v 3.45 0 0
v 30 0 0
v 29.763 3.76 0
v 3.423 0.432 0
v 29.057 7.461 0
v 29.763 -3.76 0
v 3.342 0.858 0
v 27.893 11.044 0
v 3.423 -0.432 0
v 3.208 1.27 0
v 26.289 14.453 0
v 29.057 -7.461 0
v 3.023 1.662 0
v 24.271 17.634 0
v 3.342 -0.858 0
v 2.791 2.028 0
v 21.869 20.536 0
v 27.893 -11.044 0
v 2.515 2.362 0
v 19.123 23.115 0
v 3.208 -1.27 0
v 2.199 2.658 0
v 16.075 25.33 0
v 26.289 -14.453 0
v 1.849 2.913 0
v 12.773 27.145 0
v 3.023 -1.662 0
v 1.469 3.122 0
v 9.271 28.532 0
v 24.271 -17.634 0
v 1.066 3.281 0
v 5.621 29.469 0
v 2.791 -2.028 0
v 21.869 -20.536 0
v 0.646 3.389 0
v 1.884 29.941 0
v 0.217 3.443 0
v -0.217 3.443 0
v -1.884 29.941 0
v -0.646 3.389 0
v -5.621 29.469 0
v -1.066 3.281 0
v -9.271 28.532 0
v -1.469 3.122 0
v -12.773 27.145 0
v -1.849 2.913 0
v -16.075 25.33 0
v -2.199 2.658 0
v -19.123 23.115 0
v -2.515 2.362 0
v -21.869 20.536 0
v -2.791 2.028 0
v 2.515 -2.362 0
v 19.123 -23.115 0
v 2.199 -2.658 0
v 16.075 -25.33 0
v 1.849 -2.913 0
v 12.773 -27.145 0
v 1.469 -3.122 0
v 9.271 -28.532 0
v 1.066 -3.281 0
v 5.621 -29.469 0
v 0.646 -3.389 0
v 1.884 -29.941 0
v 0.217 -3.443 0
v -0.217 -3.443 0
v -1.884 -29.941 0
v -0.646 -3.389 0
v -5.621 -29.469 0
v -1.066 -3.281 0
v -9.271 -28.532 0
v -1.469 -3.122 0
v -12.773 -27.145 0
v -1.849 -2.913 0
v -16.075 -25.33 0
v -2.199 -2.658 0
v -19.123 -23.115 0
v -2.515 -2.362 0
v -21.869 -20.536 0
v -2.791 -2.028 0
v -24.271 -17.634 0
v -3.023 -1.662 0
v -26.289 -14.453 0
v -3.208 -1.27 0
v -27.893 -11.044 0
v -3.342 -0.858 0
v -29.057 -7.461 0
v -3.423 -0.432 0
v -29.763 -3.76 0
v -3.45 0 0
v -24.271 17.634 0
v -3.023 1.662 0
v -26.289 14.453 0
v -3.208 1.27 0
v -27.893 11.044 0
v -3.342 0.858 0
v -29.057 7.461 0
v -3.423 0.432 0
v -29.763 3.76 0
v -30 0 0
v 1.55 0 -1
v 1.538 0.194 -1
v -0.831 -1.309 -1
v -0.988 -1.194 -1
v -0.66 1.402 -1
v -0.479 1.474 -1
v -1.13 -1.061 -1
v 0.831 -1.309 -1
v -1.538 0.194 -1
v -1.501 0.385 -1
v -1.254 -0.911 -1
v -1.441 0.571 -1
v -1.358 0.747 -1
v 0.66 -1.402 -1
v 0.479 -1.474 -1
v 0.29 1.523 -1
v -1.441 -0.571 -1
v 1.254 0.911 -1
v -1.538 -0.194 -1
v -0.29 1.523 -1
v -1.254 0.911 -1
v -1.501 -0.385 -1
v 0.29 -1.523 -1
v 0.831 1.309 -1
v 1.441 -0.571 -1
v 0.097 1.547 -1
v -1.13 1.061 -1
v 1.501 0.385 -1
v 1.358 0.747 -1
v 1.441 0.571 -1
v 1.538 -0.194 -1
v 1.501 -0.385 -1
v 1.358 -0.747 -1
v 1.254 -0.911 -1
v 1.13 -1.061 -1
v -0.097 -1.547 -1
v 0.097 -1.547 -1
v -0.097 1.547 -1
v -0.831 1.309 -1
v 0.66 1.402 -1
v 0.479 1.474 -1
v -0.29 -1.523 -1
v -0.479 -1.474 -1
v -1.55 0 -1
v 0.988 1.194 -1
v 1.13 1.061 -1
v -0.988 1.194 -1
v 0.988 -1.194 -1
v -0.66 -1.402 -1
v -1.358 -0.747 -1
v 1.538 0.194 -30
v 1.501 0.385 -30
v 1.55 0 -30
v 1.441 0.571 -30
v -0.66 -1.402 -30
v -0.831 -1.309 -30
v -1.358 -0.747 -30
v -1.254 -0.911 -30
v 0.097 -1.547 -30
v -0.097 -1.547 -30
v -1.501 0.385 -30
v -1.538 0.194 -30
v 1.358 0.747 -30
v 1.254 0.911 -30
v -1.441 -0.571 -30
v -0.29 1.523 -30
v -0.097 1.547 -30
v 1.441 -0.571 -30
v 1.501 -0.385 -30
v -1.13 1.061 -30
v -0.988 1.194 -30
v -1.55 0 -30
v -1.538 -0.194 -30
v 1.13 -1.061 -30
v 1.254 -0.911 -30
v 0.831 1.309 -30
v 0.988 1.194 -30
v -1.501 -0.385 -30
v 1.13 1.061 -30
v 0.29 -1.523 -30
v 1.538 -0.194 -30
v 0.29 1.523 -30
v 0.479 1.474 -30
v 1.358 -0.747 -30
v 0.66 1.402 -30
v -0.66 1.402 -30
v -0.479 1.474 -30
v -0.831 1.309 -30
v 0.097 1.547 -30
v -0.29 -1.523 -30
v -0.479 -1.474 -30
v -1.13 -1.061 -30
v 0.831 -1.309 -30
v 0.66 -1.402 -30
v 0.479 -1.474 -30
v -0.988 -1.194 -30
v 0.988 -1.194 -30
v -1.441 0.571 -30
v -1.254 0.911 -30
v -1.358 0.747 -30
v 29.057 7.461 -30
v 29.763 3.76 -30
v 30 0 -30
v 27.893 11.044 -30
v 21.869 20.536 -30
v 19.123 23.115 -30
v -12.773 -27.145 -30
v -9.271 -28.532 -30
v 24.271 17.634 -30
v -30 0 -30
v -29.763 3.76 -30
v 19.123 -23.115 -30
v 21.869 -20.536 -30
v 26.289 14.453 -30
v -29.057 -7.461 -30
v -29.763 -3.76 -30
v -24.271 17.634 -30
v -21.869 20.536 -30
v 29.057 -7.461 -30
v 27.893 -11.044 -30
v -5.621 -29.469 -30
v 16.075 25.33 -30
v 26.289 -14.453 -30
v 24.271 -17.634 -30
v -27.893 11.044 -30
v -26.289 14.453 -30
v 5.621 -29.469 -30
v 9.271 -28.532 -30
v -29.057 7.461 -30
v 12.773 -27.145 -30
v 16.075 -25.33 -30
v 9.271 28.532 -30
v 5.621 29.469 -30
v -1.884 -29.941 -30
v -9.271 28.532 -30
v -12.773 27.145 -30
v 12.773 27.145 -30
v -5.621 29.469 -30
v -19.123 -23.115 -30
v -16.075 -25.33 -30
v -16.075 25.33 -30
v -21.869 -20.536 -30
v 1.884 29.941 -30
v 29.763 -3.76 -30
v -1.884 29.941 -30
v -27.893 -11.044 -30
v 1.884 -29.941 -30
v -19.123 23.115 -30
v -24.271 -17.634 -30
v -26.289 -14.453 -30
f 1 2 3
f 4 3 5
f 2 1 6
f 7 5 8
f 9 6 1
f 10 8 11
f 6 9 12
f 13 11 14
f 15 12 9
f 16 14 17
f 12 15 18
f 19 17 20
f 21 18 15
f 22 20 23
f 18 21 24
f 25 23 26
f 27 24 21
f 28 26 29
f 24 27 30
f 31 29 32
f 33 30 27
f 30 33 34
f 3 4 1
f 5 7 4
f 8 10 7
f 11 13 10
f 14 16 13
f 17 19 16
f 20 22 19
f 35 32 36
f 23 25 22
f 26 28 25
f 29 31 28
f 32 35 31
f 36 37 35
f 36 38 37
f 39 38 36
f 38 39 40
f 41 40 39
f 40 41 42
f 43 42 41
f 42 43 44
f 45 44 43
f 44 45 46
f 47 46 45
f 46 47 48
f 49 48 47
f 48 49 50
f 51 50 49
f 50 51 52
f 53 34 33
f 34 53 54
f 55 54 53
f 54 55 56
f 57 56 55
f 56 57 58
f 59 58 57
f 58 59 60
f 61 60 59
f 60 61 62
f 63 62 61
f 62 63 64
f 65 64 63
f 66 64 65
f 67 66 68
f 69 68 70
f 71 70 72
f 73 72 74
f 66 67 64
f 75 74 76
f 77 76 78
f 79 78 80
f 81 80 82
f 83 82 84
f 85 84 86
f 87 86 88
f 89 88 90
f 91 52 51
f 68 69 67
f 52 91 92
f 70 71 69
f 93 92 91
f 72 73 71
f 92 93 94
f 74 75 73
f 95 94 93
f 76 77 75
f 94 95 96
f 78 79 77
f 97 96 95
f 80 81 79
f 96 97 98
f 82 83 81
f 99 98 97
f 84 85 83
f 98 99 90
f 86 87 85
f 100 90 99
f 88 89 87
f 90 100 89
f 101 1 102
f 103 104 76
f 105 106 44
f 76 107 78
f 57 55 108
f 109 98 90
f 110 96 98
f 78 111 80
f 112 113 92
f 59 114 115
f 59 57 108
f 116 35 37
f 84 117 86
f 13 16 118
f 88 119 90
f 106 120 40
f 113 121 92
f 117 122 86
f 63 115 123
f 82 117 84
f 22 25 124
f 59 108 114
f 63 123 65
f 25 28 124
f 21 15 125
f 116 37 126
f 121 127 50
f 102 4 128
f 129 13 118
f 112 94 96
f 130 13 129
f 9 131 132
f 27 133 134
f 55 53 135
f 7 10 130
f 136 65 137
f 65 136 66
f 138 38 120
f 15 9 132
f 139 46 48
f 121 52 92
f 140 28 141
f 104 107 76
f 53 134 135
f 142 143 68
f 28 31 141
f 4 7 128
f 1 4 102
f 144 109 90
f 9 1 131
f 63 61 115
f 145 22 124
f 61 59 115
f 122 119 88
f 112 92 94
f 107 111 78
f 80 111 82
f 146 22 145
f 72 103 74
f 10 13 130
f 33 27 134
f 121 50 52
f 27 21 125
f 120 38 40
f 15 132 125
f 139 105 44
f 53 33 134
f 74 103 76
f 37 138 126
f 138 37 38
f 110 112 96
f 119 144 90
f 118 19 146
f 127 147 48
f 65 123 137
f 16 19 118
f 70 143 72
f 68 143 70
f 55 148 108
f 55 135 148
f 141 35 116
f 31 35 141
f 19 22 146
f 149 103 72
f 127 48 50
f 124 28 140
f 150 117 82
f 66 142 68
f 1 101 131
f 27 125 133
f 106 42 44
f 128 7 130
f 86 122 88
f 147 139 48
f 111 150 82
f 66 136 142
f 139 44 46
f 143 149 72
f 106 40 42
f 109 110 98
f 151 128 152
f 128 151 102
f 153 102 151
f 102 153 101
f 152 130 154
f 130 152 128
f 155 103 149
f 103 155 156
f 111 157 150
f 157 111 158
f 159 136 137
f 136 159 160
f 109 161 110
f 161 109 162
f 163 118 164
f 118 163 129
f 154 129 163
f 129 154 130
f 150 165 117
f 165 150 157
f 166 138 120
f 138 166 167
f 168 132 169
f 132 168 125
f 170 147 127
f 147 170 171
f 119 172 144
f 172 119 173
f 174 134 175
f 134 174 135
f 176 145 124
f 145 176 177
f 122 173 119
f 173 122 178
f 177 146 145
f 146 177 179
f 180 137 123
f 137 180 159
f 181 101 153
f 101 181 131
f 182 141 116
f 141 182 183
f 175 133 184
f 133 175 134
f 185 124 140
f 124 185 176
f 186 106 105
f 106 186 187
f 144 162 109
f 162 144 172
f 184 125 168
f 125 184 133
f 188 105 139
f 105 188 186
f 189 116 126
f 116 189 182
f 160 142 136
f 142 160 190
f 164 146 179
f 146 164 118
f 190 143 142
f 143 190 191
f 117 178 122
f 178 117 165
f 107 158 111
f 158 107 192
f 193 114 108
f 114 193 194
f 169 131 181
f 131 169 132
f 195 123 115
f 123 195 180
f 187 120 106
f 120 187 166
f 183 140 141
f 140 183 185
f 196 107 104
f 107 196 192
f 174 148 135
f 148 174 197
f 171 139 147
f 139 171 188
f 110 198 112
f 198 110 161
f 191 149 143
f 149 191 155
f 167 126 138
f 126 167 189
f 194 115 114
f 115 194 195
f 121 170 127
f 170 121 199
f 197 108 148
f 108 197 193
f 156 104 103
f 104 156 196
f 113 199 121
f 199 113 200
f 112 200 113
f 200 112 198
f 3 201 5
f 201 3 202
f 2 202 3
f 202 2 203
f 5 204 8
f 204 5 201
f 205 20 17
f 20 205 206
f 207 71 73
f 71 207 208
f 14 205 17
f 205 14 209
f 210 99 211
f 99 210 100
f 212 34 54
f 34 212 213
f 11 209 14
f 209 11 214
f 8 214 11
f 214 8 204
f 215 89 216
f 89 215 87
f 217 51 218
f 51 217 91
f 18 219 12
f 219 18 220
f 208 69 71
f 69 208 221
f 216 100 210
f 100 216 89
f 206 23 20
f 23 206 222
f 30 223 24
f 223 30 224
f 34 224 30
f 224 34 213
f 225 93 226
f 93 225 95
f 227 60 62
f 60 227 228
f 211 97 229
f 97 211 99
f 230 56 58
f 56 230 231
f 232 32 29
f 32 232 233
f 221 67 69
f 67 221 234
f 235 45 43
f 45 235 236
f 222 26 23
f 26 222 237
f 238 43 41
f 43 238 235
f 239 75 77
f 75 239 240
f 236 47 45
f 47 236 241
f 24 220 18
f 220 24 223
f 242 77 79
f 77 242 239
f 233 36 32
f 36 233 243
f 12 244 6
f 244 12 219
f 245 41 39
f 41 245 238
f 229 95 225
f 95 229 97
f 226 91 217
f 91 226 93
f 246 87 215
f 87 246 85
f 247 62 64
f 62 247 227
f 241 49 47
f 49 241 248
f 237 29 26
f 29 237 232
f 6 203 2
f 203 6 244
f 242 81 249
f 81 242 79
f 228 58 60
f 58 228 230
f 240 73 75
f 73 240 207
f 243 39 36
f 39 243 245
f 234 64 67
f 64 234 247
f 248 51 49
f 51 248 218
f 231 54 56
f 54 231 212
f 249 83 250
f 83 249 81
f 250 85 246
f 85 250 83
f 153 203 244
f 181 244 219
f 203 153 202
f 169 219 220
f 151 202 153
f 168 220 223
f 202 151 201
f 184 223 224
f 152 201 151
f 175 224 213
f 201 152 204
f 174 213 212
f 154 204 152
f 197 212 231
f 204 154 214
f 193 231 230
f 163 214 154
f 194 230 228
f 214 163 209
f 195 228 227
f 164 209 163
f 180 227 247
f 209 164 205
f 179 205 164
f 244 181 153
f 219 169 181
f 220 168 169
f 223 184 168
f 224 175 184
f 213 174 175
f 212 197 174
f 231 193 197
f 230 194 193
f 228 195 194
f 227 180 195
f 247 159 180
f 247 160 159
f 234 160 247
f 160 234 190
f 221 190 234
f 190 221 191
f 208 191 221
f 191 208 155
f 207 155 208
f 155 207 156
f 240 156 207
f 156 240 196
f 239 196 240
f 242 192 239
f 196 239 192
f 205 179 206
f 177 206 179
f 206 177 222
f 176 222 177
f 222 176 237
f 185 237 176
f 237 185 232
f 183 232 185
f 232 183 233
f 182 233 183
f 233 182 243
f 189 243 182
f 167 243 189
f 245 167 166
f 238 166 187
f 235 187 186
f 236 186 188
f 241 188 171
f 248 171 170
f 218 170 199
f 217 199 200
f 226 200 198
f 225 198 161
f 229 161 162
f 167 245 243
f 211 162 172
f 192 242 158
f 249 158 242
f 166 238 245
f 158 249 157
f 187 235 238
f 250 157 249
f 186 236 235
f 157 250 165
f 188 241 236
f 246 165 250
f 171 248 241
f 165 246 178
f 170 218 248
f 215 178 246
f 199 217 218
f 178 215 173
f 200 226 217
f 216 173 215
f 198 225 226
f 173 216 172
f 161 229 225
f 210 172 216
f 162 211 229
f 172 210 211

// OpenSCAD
$fn = 50;

difference() {
	union() {
		translate(v = [0, 0, -30.0]) {
			cylinder(h = 30, r = 30.0);
		}
	}
	union() {
		translate(v = [0, 0, 0]) {
			rotate(a = [0, 0, 0]) {
				difference() {
					union() {
						translate(v = [0, 0, -33.0]) {
							cylinder(h = 33, r = 1.25);
						}
						translate(v = [0, 0, -1.0]) {
							cylinder(h = 1.0, r1 = 1.55, r2 = 3.45);
						}
						translate(v = [0, 0, -33.0]) {
							cylinder(h = 33, r = 1.55);
						}
						translate(v = [0, 0, -33.0]) {
							cylinder(h = 33, r = 1.25);
						}
					}
					union();
				}
			}
		}
	}
}
